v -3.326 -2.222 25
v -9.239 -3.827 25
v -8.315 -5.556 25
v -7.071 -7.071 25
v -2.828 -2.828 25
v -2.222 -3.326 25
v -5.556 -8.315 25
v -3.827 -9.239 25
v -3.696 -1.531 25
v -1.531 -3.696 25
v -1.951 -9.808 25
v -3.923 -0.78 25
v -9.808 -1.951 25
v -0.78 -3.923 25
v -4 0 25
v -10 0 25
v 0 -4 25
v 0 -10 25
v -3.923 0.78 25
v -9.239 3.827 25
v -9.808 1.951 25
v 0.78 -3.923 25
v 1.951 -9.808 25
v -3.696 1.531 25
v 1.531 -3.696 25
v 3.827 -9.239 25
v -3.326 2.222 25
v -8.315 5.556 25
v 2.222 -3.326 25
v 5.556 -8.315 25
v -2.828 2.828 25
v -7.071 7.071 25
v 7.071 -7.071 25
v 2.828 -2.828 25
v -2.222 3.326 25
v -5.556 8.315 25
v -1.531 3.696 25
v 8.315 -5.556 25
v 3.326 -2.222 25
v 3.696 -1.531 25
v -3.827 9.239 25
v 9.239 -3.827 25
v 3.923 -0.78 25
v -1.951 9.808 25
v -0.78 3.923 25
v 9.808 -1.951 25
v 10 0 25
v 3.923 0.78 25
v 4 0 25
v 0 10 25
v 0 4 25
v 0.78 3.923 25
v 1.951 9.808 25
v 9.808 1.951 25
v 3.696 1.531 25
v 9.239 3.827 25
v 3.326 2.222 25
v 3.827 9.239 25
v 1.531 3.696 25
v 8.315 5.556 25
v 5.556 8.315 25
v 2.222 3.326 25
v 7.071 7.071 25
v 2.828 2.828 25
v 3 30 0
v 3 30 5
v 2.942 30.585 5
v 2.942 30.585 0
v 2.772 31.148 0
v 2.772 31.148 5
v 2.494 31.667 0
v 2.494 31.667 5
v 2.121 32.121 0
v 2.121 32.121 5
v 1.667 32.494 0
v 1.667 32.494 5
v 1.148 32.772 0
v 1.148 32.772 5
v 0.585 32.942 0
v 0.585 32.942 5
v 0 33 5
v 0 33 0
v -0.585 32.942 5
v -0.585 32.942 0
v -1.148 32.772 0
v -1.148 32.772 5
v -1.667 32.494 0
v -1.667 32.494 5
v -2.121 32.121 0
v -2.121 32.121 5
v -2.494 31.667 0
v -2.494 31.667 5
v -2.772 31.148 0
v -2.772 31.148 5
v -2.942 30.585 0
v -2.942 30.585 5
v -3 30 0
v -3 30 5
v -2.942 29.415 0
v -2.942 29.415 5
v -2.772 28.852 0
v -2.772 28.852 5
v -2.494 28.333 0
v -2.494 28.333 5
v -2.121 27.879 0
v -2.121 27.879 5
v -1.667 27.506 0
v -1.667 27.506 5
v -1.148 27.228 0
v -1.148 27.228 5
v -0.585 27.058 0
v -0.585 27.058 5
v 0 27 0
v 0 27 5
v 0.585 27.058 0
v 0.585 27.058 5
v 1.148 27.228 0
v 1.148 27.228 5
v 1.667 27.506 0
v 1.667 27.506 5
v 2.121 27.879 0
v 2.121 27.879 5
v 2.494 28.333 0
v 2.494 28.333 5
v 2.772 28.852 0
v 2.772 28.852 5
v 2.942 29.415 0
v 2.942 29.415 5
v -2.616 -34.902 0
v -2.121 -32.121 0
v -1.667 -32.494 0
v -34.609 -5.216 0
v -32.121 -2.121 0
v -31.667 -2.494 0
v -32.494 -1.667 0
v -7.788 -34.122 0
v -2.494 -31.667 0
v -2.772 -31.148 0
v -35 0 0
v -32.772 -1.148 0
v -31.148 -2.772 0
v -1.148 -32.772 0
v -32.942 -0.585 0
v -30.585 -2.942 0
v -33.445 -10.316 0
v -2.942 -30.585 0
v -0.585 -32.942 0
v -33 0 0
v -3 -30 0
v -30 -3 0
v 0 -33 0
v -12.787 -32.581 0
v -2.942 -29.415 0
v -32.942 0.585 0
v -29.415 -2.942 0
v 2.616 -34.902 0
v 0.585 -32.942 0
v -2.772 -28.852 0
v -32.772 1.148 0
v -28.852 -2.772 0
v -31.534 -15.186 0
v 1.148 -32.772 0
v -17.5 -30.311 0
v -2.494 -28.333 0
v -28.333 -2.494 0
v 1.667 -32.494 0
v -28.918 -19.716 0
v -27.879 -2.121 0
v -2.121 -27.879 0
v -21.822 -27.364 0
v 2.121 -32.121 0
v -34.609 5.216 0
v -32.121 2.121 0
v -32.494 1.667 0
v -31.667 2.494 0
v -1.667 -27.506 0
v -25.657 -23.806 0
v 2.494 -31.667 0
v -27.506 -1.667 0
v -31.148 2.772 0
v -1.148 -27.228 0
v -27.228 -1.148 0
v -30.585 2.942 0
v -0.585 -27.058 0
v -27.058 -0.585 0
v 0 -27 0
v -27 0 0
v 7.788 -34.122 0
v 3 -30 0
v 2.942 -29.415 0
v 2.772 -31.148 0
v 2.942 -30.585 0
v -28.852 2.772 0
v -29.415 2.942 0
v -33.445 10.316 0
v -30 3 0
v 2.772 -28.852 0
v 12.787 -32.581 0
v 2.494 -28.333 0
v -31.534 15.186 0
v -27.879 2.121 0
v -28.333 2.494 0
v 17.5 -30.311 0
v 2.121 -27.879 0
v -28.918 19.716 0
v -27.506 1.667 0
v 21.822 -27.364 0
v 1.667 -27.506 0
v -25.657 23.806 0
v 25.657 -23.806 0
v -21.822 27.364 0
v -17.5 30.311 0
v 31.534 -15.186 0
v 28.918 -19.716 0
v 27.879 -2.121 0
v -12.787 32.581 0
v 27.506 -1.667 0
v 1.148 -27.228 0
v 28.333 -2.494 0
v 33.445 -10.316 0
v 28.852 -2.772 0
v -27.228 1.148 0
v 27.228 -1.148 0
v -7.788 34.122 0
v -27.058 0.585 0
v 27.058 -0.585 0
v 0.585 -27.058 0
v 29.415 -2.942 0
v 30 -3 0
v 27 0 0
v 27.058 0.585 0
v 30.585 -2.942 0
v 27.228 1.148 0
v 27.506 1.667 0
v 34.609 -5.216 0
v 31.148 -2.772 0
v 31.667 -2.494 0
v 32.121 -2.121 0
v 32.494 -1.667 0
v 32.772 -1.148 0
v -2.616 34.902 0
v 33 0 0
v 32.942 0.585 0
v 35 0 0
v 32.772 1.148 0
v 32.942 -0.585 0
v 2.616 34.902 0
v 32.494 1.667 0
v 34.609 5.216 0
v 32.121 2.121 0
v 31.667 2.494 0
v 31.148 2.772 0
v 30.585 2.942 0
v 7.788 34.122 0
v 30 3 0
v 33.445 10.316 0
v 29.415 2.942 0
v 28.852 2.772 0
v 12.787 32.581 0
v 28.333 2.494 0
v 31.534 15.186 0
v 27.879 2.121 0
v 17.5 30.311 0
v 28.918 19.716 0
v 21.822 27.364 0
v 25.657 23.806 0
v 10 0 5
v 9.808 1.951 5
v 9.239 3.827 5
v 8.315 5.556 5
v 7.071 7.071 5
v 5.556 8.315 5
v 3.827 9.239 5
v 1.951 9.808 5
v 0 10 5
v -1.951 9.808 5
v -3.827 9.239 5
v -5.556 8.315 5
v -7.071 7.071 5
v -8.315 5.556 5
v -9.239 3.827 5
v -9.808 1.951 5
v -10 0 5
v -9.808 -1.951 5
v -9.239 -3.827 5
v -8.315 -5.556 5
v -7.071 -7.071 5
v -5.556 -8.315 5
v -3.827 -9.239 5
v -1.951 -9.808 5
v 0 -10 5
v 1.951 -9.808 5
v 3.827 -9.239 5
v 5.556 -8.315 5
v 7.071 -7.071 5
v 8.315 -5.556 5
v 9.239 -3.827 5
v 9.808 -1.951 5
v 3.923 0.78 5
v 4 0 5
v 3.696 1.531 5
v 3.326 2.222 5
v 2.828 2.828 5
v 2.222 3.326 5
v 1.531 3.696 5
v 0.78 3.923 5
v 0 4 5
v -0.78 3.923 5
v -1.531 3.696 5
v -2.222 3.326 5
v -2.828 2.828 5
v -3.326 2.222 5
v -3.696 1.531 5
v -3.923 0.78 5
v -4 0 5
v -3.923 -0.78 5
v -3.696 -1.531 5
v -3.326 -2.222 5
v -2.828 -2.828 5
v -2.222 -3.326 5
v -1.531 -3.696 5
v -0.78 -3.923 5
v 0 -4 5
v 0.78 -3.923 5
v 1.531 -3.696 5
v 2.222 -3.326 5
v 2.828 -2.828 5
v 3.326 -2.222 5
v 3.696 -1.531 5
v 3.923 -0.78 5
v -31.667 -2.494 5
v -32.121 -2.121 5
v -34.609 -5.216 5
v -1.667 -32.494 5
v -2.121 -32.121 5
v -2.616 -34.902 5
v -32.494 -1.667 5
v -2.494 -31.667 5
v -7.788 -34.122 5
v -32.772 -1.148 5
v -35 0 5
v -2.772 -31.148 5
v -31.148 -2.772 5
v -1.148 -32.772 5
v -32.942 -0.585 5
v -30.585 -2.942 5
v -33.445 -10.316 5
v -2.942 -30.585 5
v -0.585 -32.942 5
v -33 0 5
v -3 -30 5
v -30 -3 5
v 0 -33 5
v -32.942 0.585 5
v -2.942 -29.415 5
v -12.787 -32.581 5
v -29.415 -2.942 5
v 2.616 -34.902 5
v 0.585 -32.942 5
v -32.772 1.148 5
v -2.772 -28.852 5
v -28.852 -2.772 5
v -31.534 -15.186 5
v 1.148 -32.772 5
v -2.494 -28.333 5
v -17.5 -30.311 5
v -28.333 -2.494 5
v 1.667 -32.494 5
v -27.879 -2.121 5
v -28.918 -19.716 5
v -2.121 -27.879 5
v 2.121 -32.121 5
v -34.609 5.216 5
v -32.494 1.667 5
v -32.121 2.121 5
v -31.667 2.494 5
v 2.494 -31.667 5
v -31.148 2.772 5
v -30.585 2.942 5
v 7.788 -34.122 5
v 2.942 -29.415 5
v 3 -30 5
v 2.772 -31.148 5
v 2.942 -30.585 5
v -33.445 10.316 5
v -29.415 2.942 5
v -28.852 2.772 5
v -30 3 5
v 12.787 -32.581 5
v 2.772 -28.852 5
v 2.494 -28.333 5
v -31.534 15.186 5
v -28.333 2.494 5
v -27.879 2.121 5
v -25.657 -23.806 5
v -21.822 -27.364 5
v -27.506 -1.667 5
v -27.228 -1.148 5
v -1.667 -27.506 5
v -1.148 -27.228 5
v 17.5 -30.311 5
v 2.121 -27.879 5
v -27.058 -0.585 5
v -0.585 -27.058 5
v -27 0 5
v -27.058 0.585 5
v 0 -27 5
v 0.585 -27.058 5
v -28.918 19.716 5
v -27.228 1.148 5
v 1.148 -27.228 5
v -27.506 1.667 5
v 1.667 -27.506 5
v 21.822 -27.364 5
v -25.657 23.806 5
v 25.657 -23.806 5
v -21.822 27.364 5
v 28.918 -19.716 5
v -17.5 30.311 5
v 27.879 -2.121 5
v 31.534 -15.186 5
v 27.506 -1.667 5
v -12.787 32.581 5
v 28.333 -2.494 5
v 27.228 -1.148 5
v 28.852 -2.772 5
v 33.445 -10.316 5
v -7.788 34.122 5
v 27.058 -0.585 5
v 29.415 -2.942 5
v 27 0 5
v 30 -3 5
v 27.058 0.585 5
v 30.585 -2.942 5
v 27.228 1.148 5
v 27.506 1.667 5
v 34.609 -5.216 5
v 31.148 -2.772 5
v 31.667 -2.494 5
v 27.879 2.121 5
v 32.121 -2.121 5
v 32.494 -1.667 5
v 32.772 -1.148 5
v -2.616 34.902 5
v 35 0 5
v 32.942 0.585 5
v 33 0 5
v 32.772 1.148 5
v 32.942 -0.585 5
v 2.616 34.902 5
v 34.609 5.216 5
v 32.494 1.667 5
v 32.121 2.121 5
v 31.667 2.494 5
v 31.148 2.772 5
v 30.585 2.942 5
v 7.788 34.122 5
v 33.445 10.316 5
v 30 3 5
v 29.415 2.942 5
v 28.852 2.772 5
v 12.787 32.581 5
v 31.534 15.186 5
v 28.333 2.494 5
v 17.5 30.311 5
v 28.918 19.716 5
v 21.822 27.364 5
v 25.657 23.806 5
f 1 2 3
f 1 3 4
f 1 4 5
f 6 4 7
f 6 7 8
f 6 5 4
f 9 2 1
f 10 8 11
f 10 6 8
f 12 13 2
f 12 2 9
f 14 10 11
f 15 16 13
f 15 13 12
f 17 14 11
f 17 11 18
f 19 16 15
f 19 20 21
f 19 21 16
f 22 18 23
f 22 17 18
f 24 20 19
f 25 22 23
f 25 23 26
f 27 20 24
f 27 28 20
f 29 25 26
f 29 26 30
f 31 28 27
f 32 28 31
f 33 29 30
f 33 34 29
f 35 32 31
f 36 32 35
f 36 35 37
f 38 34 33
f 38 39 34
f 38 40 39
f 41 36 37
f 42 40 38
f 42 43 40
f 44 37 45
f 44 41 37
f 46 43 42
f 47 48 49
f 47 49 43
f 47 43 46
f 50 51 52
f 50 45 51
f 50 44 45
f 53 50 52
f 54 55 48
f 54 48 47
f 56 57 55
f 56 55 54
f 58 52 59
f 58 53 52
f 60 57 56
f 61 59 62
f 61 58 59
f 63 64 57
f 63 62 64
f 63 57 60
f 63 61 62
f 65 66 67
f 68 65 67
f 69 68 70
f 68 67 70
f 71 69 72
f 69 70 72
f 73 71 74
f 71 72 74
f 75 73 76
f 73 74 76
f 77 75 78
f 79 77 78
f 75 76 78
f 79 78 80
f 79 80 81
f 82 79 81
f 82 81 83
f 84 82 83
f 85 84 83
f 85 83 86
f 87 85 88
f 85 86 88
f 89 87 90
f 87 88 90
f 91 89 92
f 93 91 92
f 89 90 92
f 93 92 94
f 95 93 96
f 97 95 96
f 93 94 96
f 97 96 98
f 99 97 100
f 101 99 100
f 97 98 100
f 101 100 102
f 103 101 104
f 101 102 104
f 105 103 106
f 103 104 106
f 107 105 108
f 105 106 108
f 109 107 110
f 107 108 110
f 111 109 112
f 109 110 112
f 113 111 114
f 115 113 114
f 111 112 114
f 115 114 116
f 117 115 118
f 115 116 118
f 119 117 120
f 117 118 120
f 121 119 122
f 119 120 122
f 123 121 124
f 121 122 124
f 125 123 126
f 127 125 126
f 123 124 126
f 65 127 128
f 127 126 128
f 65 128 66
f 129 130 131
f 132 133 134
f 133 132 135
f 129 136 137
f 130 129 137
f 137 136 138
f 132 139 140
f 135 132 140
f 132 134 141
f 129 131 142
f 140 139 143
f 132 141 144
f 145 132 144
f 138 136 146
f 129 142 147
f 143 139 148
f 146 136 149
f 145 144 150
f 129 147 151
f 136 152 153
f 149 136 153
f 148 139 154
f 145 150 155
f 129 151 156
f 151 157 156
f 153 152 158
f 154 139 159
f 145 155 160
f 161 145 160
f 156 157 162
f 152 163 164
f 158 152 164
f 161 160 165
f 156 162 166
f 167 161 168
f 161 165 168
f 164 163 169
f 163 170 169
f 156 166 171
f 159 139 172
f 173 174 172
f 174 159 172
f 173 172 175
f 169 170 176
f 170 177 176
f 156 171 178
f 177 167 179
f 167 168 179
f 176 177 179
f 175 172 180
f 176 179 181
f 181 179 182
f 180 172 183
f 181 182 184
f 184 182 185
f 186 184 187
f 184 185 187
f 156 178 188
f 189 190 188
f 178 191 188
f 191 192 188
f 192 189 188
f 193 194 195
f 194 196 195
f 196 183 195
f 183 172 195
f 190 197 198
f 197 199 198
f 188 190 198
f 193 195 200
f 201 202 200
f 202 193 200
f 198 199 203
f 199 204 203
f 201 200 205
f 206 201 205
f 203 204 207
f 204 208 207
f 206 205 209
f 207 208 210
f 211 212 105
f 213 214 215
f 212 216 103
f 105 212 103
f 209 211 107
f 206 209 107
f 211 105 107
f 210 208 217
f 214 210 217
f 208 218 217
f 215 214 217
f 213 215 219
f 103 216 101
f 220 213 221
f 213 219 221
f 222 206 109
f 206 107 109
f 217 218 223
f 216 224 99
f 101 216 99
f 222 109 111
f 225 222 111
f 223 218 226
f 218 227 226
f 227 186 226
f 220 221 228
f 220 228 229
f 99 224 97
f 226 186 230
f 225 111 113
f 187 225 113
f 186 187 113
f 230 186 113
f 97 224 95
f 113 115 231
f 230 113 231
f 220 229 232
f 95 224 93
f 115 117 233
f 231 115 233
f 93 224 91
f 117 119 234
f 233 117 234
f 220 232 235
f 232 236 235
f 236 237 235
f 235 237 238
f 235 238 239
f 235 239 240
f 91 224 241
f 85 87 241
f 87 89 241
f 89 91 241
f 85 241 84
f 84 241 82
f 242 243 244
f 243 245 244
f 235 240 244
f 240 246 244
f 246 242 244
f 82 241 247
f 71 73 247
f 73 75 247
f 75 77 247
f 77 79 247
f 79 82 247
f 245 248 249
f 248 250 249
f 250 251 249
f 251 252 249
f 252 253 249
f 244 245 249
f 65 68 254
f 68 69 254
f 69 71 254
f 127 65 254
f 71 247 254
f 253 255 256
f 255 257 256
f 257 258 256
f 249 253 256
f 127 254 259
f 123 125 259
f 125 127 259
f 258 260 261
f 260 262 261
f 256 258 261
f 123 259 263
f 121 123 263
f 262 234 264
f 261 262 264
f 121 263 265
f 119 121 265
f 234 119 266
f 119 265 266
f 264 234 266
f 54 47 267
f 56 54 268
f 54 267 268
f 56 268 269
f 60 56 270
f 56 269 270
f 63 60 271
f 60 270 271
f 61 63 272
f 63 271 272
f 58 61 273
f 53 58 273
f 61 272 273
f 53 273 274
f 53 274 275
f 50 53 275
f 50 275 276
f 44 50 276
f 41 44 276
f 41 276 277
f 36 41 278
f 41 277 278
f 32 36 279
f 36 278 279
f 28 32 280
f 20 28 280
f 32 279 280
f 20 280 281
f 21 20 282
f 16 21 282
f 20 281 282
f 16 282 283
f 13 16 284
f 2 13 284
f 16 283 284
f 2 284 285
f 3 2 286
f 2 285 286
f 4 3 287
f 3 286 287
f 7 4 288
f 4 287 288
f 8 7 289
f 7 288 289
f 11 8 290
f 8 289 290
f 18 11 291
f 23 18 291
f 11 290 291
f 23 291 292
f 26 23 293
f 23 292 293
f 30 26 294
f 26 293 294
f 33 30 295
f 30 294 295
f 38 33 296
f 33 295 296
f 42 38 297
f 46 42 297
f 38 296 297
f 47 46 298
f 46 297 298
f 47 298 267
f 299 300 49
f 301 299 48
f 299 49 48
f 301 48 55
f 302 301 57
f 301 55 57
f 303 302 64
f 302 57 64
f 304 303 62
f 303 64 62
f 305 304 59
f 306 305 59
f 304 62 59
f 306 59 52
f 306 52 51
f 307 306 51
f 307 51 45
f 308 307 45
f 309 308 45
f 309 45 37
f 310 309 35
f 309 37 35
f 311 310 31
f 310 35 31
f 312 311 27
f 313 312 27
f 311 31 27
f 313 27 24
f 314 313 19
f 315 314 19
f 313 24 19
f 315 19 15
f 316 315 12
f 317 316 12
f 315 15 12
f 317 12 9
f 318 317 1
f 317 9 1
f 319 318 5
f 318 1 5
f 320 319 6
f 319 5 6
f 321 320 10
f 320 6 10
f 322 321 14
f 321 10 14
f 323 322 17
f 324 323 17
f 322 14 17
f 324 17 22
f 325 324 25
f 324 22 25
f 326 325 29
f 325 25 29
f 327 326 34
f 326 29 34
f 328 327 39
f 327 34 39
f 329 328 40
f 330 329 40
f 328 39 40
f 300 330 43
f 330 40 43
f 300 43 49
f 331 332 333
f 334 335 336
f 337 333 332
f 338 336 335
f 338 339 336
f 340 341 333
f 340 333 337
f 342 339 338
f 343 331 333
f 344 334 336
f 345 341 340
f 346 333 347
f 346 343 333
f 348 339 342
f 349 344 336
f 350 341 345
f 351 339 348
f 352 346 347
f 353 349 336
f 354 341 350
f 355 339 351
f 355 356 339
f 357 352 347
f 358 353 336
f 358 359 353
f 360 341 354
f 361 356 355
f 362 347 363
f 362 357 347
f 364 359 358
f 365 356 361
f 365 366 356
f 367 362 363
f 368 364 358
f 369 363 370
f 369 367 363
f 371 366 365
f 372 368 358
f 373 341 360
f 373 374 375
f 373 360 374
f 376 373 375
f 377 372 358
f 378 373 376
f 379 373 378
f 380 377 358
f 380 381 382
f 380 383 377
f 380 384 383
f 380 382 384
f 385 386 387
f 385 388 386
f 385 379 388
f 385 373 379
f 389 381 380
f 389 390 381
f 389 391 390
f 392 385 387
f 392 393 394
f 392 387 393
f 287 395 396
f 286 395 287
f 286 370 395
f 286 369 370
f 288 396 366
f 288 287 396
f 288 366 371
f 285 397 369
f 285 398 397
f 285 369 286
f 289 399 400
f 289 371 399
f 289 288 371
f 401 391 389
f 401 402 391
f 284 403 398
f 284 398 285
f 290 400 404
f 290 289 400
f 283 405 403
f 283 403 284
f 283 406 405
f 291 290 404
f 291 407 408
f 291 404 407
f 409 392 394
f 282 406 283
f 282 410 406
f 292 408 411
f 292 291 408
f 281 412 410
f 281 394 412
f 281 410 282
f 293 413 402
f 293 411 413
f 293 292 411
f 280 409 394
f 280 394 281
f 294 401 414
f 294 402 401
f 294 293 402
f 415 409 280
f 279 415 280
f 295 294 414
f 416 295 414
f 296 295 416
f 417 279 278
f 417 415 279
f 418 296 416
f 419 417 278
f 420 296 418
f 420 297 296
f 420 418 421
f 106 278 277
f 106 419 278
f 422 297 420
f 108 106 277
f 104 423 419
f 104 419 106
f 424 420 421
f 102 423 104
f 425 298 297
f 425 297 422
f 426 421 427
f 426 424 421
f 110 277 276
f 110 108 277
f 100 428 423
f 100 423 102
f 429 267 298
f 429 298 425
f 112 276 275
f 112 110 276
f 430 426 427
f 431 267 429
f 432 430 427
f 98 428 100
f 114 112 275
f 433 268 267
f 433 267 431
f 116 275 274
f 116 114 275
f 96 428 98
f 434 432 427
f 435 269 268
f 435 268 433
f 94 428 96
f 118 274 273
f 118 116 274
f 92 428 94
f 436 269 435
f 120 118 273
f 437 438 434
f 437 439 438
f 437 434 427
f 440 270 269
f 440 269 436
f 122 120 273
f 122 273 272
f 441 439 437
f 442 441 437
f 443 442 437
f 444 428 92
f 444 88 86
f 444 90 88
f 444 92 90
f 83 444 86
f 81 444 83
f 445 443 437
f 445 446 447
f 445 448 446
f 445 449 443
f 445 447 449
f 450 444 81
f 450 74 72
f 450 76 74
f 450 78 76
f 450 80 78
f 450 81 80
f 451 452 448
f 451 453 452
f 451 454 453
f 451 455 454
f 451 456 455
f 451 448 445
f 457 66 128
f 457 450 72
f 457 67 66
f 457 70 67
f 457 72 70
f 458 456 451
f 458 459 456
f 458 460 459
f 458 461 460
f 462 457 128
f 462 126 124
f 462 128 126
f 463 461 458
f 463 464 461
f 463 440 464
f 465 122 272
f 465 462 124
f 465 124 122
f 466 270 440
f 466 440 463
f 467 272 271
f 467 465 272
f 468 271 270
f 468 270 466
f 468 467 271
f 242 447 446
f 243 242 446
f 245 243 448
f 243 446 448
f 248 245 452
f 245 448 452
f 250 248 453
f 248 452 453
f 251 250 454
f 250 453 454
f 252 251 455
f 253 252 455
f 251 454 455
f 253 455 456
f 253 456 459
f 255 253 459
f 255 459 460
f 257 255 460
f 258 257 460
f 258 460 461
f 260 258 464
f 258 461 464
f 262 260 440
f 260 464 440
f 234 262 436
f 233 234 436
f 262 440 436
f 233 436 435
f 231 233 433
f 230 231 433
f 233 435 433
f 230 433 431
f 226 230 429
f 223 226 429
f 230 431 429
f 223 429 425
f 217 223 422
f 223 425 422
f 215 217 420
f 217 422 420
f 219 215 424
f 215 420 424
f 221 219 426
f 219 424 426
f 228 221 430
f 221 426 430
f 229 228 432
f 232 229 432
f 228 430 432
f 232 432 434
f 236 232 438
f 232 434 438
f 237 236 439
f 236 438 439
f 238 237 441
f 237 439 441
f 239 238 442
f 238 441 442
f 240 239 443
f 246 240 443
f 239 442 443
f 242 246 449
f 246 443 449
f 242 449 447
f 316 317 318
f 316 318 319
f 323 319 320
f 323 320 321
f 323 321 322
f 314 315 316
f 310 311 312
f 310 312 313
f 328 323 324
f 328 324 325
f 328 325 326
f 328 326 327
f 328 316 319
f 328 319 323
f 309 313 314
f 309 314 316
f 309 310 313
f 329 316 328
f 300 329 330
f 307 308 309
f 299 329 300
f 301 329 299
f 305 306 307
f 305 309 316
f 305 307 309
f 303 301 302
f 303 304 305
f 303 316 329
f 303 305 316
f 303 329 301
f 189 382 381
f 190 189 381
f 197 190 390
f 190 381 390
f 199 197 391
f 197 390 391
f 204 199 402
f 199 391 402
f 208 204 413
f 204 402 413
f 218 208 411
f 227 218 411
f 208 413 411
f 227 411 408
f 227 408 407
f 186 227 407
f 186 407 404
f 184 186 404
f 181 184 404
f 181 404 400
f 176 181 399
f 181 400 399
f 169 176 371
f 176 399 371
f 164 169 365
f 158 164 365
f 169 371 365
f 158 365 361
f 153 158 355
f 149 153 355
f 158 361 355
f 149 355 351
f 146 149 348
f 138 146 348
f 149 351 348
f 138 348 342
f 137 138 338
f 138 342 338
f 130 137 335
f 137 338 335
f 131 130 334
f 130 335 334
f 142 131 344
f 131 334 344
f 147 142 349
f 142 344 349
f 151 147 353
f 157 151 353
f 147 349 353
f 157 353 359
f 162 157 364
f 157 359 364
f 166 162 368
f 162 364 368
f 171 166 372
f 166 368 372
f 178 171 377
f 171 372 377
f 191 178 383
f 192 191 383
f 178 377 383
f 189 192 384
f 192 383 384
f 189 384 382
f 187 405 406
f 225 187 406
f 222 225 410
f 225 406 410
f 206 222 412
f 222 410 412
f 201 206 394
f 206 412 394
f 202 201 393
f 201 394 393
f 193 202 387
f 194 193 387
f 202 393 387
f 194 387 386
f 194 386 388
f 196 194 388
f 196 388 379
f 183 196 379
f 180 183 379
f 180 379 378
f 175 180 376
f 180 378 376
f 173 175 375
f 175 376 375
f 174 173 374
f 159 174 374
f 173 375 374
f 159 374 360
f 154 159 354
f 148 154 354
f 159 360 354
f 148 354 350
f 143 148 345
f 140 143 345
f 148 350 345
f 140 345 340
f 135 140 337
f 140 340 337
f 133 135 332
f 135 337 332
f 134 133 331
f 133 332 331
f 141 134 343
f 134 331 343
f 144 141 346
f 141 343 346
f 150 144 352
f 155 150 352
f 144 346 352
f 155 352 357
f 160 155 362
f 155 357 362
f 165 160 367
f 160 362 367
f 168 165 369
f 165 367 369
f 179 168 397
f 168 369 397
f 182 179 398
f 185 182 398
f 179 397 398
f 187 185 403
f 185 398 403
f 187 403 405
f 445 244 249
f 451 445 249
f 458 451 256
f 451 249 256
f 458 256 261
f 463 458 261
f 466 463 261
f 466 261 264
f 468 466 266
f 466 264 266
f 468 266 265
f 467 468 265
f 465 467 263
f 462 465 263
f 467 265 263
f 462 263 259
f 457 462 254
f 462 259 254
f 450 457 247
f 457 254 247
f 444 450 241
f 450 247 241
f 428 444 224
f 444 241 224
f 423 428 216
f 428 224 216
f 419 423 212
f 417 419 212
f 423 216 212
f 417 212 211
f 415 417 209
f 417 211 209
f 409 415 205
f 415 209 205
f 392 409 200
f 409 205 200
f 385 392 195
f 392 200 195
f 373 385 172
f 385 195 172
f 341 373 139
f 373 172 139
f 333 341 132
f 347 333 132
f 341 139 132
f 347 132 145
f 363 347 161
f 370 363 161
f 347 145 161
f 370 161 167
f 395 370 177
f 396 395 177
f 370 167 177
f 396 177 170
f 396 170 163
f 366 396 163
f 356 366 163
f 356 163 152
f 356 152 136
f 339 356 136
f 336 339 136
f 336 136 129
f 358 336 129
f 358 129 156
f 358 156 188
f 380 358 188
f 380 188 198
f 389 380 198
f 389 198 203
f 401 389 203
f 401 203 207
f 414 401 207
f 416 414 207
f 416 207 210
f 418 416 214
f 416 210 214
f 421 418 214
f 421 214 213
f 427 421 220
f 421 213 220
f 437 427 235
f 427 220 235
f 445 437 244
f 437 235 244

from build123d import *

# Parameters (mm, degrees)
SKETCH1_R           = 35
BOSS_EXTRUDE1_DEPTH = 5
SKETCH4_R           = 3
CUT_EXTRUDE1_DEPTH  = 5
SKETCH5_R           = 10
BOSS_EXTRUDE2_DEPTH = 20
SKETCH6_R           = 4
CUT_EXTRUDE2_DEPTH  = 20


with BuildPart() as part:
    # Sketch1 → Boss-Extrude1 (new body)
    with BuildSketch(Plane.XY):
        Circle(SKETCH1_R)
    extrude(amount=BOSS_EXTRUDE1_DEPTH)

    # Sketch4 → Cut-Extrude1 (cut)
    with BuildSketch(Plane.XY.offset(5)):
        with Locations((0, 30)):
            Circle(SKETCH4_R)
        with Locations((30, 0)):
            Circle(SKETCH4_R)
        with Locations((0, -30)):
            Circle(SKETCH4_R)
        with Locations((-30, 0)):
            Circle(SKETCH4_R)
    extrude(amount=-CUT_EXTRUDE1_DEPTH, mode=Mode.SUBTRACT)

    # Sketch5 → Boss-Extrude2 (add)
    with BuildSketch(Plane.XY.offset(5)):
        Circle(SKETCH5_R)
    extrude(amount=BOSS_EXTRUDE2_DEPTH)

    # Sketch6 → Cut-Extrude2 (cut)
    with BuildSketch(Plane.XY.offset(25)):
        Circle(SKETCH6_R)
    extrude(amount=-CUT_EXTRUDE2_DEPTH, mode=Mode.SUBTRACT)


solid = part.part
